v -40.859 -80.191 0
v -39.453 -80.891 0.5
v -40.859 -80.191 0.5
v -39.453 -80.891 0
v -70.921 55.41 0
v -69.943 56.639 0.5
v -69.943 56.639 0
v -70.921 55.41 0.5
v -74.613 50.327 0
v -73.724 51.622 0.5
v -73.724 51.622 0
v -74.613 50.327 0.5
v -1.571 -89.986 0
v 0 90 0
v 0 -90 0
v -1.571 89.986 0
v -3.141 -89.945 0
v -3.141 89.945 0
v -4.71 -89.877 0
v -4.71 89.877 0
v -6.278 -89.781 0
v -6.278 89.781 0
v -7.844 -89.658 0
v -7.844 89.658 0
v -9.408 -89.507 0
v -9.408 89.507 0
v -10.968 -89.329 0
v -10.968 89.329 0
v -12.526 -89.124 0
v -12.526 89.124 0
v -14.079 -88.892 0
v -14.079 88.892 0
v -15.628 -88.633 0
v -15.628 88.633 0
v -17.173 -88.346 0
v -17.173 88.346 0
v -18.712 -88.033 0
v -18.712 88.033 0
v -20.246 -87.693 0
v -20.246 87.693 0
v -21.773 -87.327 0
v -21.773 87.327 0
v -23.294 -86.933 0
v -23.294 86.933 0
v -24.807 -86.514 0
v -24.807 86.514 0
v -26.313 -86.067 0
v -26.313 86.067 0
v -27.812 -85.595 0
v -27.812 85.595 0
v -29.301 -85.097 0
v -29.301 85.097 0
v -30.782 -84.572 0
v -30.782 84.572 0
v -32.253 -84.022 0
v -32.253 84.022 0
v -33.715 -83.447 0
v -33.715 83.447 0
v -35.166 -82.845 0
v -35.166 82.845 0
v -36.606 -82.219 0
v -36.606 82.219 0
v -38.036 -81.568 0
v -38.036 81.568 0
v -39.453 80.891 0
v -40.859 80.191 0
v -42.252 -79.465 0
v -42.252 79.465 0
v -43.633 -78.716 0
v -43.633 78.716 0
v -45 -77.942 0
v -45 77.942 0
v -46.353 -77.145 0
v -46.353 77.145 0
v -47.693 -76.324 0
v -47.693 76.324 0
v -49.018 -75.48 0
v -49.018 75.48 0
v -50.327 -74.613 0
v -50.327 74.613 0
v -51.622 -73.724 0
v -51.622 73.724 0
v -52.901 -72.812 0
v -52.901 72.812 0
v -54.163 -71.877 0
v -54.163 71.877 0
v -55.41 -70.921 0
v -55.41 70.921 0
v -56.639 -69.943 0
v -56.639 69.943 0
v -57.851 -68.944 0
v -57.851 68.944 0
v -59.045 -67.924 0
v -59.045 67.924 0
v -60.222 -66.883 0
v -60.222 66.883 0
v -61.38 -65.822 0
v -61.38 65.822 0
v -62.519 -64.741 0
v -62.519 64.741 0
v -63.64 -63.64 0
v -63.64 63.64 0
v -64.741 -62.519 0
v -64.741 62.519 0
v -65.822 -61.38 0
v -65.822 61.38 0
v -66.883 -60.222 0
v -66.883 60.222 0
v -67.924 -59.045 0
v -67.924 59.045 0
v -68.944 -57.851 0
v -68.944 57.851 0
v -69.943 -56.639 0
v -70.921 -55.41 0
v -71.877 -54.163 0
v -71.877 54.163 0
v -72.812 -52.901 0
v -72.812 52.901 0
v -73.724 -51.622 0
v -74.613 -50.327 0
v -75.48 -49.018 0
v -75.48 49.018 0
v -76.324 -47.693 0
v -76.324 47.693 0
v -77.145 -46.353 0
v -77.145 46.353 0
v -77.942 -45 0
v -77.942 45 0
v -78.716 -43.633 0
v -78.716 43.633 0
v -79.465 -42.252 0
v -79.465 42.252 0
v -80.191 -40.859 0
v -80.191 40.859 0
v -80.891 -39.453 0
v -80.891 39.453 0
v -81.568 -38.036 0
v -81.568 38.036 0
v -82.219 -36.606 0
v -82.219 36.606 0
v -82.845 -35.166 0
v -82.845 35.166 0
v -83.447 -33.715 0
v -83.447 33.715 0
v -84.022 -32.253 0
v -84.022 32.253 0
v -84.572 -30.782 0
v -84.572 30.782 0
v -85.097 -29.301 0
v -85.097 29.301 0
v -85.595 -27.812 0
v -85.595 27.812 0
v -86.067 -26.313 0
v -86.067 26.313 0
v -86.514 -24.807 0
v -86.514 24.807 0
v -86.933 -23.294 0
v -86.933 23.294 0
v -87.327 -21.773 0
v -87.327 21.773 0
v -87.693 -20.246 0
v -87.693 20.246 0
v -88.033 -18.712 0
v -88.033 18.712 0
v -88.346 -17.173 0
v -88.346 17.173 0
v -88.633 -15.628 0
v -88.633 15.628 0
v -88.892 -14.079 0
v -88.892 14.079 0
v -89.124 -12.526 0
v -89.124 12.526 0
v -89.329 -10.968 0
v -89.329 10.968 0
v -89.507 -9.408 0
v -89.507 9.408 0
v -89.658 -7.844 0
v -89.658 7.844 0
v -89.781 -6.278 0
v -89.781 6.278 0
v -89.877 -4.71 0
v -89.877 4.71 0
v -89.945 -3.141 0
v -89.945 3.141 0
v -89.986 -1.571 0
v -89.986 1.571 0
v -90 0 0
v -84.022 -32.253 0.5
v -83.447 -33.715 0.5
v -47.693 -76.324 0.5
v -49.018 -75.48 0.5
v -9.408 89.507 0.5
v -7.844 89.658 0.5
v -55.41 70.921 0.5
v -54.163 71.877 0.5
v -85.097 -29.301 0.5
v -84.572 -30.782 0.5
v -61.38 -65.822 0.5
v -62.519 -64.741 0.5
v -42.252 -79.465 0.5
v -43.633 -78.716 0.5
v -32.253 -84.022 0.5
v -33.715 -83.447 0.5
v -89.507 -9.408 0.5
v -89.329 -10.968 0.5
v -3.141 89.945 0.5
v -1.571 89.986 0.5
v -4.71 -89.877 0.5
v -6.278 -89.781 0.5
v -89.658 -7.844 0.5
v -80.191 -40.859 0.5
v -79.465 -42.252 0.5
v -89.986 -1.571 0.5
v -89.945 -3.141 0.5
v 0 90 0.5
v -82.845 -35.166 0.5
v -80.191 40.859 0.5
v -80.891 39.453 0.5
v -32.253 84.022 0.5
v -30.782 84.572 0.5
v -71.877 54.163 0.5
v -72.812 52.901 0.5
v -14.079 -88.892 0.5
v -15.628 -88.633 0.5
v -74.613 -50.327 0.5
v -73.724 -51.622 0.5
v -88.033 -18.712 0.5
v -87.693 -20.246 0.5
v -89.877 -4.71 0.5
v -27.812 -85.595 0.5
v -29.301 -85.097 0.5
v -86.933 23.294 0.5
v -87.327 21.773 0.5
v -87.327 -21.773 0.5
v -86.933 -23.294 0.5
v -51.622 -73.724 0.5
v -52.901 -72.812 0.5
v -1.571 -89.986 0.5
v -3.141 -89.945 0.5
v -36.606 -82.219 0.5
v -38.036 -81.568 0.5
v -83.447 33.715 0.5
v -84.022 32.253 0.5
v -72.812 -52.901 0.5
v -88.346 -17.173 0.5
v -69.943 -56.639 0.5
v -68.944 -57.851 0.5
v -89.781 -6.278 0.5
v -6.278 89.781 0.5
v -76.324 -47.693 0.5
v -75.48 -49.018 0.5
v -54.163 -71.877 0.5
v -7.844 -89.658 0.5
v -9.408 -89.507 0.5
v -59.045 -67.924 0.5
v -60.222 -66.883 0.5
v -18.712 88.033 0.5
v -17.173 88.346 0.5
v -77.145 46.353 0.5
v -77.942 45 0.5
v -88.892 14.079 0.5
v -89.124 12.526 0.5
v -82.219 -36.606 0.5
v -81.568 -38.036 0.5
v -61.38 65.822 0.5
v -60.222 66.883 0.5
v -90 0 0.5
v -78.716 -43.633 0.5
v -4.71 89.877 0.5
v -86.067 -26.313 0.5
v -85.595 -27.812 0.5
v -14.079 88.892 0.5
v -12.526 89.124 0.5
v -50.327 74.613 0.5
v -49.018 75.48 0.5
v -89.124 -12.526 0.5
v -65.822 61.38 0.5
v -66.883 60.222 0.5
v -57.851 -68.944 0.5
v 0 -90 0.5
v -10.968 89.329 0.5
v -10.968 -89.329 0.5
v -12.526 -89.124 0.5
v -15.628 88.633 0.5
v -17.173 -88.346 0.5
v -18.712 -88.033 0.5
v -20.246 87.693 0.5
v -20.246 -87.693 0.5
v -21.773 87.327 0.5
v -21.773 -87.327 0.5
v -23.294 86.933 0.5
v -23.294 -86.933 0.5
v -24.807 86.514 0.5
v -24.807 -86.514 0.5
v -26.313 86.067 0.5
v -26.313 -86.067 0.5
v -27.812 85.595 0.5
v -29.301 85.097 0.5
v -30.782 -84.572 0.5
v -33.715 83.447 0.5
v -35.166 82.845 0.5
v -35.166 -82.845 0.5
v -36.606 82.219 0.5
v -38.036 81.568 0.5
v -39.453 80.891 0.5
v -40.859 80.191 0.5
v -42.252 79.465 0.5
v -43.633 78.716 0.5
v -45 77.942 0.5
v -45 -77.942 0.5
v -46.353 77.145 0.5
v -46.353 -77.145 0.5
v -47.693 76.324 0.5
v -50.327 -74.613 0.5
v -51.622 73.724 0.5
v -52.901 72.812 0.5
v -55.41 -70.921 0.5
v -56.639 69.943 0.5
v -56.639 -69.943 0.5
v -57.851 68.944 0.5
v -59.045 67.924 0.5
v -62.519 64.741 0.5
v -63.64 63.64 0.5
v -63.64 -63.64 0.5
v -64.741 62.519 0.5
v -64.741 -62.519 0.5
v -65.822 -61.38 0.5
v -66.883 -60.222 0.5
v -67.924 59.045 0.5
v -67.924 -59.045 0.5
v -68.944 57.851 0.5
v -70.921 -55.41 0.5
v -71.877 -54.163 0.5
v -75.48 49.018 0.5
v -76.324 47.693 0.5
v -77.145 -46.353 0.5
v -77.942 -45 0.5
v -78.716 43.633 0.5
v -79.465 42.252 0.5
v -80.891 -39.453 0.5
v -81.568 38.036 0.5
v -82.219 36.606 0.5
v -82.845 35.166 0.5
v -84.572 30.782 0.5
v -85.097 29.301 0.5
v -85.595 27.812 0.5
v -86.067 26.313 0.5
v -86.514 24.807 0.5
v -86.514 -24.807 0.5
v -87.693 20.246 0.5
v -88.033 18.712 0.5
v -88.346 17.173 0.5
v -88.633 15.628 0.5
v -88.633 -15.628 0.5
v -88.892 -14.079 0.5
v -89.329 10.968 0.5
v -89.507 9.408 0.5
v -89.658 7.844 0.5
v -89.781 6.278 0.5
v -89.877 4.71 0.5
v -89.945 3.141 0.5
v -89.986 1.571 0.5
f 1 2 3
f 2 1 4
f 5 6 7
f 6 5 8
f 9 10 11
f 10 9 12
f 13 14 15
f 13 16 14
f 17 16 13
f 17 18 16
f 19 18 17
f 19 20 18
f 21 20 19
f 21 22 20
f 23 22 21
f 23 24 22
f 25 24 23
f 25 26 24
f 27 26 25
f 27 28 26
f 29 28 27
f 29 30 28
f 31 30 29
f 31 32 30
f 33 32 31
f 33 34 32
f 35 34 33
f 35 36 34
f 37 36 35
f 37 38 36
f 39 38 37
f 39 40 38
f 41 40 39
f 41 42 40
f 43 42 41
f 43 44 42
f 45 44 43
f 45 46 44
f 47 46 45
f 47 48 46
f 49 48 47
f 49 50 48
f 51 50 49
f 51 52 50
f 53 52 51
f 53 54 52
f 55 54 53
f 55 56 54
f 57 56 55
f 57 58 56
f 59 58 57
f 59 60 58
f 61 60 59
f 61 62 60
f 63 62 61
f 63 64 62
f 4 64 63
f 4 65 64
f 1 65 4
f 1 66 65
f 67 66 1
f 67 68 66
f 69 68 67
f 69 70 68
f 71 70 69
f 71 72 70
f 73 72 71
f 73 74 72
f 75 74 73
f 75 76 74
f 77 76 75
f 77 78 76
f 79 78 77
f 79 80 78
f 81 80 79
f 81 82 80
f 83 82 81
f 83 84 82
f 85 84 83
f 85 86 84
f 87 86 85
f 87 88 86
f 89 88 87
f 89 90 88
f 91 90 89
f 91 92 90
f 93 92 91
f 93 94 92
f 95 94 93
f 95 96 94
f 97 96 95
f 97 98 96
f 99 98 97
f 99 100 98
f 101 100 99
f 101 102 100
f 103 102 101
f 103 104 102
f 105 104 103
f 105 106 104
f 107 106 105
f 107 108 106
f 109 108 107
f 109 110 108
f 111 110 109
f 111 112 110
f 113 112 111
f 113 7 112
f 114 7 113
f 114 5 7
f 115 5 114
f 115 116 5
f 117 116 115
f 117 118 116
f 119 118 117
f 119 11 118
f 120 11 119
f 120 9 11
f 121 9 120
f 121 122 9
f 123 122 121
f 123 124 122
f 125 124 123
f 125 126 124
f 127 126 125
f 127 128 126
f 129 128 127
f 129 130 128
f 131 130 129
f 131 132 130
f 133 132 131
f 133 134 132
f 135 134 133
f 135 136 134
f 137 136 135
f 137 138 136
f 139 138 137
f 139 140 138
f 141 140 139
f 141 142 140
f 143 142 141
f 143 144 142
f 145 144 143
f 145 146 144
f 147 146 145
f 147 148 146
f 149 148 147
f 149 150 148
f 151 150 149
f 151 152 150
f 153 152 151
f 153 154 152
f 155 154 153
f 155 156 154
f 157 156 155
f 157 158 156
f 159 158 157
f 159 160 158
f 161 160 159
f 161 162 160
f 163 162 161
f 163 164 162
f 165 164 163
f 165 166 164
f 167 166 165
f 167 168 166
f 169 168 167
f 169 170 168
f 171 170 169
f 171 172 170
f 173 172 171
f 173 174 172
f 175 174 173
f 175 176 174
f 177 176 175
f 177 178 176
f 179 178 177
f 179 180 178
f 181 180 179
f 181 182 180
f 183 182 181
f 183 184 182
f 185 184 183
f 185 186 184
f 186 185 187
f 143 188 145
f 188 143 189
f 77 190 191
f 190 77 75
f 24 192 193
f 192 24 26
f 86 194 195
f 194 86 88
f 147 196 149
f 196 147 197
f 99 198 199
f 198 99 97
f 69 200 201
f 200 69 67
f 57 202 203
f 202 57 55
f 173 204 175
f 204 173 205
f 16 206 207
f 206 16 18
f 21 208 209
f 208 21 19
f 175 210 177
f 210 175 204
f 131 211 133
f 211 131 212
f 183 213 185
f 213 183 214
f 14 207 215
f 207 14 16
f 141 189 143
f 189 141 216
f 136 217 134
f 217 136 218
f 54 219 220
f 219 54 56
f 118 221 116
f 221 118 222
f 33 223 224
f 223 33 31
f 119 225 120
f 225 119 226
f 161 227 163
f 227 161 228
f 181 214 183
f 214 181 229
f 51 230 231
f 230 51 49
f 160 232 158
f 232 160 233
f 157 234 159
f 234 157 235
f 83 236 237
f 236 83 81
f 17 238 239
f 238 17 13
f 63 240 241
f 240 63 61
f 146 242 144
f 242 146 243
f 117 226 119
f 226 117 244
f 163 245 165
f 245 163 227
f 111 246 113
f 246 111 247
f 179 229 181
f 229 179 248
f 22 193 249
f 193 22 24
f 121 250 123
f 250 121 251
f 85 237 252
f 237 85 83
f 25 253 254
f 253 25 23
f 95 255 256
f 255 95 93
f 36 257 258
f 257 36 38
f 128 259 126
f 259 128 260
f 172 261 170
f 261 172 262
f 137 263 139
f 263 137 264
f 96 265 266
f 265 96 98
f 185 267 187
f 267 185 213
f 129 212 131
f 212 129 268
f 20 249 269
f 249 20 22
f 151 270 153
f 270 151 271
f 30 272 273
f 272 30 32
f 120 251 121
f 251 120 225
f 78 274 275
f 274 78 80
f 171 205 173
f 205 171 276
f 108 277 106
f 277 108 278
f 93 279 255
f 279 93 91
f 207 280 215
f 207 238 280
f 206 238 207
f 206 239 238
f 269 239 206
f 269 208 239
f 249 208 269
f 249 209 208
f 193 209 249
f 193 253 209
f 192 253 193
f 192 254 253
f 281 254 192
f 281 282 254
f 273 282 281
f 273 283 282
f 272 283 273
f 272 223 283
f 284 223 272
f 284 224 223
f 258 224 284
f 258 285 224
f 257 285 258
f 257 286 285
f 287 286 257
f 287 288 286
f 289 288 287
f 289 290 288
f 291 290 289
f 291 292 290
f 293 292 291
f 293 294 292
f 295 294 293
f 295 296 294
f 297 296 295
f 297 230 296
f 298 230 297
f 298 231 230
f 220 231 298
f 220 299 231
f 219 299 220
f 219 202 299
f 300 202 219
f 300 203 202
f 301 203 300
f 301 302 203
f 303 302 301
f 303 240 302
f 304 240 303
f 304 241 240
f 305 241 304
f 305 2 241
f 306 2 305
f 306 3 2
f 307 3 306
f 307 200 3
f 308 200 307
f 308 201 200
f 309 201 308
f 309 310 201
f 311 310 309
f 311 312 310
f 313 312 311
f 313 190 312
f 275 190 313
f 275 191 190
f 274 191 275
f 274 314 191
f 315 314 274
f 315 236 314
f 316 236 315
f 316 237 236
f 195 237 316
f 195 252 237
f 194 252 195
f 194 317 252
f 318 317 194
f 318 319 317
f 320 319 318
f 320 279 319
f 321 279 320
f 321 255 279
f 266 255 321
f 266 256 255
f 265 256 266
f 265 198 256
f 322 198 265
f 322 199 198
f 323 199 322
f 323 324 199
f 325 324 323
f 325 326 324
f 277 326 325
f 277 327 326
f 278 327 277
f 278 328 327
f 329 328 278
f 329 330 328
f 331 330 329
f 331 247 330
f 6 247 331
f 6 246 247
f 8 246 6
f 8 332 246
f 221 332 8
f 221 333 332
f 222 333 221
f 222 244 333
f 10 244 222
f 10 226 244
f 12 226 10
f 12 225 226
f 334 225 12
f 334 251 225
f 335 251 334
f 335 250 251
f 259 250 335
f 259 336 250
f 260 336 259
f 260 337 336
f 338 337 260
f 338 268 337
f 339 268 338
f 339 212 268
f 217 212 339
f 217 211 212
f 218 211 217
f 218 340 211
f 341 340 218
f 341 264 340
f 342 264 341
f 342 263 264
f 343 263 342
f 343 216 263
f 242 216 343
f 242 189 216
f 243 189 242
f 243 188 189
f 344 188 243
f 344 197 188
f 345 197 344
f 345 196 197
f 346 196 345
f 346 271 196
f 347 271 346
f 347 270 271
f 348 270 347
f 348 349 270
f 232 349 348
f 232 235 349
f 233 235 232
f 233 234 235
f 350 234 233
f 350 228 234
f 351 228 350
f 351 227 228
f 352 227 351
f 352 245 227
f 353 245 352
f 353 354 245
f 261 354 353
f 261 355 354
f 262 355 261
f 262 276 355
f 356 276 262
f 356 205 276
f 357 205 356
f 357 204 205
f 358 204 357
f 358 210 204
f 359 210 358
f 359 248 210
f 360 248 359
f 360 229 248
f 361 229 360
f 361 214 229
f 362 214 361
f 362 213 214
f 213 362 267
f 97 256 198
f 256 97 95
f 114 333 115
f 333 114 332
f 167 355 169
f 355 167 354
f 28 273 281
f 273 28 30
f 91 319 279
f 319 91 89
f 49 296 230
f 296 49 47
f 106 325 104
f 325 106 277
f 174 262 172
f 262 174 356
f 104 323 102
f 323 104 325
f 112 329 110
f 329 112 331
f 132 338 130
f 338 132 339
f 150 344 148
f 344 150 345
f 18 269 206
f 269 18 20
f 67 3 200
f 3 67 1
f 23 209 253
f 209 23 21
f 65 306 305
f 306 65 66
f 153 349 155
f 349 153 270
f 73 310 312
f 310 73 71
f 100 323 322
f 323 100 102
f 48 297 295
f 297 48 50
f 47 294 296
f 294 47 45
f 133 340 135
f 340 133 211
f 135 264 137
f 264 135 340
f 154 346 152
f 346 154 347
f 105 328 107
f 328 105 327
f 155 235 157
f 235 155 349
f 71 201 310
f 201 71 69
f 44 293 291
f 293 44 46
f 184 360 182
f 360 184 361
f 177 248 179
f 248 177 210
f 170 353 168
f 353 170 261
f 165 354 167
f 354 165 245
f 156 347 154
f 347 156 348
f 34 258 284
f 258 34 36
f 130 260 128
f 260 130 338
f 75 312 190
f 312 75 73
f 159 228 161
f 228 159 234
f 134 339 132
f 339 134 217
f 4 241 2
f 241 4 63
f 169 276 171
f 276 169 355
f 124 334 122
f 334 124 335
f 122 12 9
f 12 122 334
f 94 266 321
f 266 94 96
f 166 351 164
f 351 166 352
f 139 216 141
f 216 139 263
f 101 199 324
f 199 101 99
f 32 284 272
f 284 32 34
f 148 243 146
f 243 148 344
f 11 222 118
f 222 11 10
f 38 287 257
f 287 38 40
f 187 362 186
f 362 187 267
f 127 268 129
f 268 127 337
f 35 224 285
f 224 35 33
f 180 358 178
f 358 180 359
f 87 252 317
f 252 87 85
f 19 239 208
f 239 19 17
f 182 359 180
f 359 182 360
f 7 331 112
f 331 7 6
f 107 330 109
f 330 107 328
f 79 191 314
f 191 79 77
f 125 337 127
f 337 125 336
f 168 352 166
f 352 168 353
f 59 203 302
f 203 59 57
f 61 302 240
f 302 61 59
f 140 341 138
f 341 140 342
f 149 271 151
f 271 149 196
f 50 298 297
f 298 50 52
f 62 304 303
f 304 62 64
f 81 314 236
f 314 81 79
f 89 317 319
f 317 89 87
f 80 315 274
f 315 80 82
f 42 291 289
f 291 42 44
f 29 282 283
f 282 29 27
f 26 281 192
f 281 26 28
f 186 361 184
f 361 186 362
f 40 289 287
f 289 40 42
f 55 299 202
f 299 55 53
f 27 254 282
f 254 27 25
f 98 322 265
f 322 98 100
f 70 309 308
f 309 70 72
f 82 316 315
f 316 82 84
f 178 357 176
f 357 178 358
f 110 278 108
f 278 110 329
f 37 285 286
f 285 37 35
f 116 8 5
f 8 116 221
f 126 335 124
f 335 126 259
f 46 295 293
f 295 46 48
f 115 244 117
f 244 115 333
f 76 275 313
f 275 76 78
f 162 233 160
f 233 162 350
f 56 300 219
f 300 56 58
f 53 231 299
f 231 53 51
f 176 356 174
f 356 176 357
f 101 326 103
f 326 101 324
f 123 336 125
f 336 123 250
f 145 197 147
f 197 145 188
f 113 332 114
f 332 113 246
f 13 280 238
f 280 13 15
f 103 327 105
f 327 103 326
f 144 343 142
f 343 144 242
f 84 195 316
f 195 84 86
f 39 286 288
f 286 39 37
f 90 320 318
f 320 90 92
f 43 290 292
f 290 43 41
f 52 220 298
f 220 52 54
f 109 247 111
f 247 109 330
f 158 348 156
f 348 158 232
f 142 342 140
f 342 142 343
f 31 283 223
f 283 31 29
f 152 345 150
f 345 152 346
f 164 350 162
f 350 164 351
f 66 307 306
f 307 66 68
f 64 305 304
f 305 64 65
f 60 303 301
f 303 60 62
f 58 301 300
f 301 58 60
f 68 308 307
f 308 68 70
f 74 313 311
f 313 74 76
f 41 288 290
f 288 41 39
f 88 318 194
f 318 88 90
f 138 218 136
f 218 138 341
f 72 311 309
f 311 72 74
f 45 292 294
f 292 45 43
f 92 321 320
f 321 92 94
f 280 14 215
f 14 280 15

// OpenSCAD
$fn=360;

module blende()
{
color("gray")
linear_extrude(0.5)
circle(d=180);
}

module aussparung()
{
translate([10,0,0.25])
cube([20,120,0.5],true);
}

difference()
{
    blende();
    //aussparung(); aussparung3();
    aussparung2();
}

module aussparung2()
{
translate([45,0,0.25])
cube([90,180,0.5],true);
}

module aussparung3()
{
translate([-45,0,0.25])
cube([90,180,0.5],true);
}
